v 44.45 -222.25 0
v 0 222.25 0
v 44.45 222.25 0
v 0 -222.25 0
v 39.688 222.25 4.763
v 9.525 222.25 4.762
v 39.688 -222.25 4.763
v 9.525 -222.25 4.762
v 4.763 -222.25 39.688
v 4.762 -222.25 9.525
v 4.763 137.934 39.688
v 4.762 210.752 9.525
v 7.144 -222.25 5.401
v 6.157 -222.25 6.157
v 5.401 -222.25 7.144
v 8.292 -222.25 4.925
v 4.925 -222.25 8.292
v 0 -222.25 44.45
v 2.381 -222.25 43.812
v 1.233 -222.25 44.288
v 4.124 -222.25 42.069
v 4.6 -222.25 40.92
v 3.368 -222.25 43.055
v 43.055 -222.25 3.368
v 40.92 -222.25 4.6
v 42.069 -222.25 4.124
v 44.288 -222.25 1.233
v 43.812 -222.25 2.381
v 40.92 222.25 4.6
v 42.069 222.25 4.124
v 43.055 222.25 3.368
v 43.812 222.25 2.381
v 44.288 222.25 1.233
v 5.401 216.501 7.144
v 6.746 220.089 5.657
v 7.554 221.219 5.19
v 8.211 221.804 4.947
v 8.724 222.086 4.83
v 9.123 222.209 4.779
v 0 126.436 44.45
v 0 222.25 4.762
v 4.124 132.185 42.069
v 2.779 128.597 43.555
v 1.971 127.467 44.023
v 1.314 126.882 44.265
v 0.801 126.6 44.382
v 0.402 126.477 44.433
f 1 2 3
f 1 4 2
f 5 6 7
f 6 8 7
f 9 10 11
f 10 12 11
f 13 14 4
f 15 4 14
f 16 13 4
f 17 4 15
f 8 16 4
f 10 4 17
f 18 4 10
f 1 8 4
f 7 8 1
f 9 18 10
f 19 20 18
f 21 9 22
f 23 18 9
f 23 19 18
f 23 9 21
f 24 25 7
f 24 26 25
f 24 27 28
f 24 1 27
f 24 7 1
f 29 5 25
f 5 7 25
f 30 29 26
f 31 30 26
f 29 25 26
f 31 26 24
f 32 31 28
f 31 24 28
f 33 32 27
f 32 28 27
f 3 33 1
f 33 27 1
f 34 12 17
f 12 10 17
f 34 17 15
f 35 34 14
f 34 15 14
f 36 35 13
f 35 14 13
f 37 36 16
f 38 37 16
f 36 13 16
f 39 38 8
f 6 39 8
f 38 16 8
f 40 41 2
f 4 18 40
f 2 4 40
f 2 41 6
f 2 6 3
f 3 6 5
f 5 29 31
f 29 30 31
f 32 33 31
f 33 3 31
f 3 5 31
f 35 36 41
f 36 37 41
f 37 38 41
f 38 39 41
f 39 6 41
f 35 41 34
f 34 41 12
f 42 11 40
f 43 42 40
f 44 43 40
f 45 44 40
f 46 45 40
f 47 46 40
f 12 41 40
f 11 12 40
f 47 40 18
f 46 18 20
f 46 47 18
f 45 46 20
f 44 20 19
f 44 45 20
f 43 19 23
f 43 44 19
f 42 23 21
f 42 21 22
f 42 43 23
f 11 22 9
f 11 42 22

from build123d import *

# Parameters (mm, degrees)
F0_W     = 4.7625
F0_H     = 4.7625
F0_H_2   = 39.6875
F0_W_2   = 39.6875
F1_DEPTH = 222.25
F2_R     = 4.76249
F4_DEPTH = 25.4


# Not quite as in the source:
# - a fillet or chamfer is up to 0.001 mm smaller than in the source, because OpenCascade refuses the exact size


with BuildPart() as f1:
    # F0 (on Front) → F1 (new body, symmetric)
    with BuildSketch(Plane.XZ):
        with Locations((2.38125, 2.38125)):
            Rectangle(F0_W, F0_H)
        with Locations((2.38125, 24.60625)):
            Rectangle(F0_W, F0_H_2)
        with Locations((24.60625, 2.38125)):
            Rectangle(F0_W_2, F0_H)
    extrude(amount=F1_DEPTH, both=True)

    # F2 (radius 4.7625 in the source; OpenCascade refuses exactly that, so slightly less here)
    f2_edges = [f1.edges().sort_by_distance(p)[0] for p in [
        (4.7625, 0, 4.7625),
        (4.7625, 0, 44.45),
        (44.45, 0, 4.7625),
    ]]
    fillet(f2_edges, radius=F2_R)

    # F3 (on face) → F4 (cut)
    with BuildSketch(Plane(origin=(0, 0, 0), x_dir=(0, -1, 0), z_dir=(-1, 0, 0))):
        Polygon((-222.25, 44.45), (-222.25, 4.7625), (-126.4358992433, 44.45), align=None)
    extrude(amount=-F4_DEPTH, mode=Mode.SUBTRACT)


solid = f1.part
